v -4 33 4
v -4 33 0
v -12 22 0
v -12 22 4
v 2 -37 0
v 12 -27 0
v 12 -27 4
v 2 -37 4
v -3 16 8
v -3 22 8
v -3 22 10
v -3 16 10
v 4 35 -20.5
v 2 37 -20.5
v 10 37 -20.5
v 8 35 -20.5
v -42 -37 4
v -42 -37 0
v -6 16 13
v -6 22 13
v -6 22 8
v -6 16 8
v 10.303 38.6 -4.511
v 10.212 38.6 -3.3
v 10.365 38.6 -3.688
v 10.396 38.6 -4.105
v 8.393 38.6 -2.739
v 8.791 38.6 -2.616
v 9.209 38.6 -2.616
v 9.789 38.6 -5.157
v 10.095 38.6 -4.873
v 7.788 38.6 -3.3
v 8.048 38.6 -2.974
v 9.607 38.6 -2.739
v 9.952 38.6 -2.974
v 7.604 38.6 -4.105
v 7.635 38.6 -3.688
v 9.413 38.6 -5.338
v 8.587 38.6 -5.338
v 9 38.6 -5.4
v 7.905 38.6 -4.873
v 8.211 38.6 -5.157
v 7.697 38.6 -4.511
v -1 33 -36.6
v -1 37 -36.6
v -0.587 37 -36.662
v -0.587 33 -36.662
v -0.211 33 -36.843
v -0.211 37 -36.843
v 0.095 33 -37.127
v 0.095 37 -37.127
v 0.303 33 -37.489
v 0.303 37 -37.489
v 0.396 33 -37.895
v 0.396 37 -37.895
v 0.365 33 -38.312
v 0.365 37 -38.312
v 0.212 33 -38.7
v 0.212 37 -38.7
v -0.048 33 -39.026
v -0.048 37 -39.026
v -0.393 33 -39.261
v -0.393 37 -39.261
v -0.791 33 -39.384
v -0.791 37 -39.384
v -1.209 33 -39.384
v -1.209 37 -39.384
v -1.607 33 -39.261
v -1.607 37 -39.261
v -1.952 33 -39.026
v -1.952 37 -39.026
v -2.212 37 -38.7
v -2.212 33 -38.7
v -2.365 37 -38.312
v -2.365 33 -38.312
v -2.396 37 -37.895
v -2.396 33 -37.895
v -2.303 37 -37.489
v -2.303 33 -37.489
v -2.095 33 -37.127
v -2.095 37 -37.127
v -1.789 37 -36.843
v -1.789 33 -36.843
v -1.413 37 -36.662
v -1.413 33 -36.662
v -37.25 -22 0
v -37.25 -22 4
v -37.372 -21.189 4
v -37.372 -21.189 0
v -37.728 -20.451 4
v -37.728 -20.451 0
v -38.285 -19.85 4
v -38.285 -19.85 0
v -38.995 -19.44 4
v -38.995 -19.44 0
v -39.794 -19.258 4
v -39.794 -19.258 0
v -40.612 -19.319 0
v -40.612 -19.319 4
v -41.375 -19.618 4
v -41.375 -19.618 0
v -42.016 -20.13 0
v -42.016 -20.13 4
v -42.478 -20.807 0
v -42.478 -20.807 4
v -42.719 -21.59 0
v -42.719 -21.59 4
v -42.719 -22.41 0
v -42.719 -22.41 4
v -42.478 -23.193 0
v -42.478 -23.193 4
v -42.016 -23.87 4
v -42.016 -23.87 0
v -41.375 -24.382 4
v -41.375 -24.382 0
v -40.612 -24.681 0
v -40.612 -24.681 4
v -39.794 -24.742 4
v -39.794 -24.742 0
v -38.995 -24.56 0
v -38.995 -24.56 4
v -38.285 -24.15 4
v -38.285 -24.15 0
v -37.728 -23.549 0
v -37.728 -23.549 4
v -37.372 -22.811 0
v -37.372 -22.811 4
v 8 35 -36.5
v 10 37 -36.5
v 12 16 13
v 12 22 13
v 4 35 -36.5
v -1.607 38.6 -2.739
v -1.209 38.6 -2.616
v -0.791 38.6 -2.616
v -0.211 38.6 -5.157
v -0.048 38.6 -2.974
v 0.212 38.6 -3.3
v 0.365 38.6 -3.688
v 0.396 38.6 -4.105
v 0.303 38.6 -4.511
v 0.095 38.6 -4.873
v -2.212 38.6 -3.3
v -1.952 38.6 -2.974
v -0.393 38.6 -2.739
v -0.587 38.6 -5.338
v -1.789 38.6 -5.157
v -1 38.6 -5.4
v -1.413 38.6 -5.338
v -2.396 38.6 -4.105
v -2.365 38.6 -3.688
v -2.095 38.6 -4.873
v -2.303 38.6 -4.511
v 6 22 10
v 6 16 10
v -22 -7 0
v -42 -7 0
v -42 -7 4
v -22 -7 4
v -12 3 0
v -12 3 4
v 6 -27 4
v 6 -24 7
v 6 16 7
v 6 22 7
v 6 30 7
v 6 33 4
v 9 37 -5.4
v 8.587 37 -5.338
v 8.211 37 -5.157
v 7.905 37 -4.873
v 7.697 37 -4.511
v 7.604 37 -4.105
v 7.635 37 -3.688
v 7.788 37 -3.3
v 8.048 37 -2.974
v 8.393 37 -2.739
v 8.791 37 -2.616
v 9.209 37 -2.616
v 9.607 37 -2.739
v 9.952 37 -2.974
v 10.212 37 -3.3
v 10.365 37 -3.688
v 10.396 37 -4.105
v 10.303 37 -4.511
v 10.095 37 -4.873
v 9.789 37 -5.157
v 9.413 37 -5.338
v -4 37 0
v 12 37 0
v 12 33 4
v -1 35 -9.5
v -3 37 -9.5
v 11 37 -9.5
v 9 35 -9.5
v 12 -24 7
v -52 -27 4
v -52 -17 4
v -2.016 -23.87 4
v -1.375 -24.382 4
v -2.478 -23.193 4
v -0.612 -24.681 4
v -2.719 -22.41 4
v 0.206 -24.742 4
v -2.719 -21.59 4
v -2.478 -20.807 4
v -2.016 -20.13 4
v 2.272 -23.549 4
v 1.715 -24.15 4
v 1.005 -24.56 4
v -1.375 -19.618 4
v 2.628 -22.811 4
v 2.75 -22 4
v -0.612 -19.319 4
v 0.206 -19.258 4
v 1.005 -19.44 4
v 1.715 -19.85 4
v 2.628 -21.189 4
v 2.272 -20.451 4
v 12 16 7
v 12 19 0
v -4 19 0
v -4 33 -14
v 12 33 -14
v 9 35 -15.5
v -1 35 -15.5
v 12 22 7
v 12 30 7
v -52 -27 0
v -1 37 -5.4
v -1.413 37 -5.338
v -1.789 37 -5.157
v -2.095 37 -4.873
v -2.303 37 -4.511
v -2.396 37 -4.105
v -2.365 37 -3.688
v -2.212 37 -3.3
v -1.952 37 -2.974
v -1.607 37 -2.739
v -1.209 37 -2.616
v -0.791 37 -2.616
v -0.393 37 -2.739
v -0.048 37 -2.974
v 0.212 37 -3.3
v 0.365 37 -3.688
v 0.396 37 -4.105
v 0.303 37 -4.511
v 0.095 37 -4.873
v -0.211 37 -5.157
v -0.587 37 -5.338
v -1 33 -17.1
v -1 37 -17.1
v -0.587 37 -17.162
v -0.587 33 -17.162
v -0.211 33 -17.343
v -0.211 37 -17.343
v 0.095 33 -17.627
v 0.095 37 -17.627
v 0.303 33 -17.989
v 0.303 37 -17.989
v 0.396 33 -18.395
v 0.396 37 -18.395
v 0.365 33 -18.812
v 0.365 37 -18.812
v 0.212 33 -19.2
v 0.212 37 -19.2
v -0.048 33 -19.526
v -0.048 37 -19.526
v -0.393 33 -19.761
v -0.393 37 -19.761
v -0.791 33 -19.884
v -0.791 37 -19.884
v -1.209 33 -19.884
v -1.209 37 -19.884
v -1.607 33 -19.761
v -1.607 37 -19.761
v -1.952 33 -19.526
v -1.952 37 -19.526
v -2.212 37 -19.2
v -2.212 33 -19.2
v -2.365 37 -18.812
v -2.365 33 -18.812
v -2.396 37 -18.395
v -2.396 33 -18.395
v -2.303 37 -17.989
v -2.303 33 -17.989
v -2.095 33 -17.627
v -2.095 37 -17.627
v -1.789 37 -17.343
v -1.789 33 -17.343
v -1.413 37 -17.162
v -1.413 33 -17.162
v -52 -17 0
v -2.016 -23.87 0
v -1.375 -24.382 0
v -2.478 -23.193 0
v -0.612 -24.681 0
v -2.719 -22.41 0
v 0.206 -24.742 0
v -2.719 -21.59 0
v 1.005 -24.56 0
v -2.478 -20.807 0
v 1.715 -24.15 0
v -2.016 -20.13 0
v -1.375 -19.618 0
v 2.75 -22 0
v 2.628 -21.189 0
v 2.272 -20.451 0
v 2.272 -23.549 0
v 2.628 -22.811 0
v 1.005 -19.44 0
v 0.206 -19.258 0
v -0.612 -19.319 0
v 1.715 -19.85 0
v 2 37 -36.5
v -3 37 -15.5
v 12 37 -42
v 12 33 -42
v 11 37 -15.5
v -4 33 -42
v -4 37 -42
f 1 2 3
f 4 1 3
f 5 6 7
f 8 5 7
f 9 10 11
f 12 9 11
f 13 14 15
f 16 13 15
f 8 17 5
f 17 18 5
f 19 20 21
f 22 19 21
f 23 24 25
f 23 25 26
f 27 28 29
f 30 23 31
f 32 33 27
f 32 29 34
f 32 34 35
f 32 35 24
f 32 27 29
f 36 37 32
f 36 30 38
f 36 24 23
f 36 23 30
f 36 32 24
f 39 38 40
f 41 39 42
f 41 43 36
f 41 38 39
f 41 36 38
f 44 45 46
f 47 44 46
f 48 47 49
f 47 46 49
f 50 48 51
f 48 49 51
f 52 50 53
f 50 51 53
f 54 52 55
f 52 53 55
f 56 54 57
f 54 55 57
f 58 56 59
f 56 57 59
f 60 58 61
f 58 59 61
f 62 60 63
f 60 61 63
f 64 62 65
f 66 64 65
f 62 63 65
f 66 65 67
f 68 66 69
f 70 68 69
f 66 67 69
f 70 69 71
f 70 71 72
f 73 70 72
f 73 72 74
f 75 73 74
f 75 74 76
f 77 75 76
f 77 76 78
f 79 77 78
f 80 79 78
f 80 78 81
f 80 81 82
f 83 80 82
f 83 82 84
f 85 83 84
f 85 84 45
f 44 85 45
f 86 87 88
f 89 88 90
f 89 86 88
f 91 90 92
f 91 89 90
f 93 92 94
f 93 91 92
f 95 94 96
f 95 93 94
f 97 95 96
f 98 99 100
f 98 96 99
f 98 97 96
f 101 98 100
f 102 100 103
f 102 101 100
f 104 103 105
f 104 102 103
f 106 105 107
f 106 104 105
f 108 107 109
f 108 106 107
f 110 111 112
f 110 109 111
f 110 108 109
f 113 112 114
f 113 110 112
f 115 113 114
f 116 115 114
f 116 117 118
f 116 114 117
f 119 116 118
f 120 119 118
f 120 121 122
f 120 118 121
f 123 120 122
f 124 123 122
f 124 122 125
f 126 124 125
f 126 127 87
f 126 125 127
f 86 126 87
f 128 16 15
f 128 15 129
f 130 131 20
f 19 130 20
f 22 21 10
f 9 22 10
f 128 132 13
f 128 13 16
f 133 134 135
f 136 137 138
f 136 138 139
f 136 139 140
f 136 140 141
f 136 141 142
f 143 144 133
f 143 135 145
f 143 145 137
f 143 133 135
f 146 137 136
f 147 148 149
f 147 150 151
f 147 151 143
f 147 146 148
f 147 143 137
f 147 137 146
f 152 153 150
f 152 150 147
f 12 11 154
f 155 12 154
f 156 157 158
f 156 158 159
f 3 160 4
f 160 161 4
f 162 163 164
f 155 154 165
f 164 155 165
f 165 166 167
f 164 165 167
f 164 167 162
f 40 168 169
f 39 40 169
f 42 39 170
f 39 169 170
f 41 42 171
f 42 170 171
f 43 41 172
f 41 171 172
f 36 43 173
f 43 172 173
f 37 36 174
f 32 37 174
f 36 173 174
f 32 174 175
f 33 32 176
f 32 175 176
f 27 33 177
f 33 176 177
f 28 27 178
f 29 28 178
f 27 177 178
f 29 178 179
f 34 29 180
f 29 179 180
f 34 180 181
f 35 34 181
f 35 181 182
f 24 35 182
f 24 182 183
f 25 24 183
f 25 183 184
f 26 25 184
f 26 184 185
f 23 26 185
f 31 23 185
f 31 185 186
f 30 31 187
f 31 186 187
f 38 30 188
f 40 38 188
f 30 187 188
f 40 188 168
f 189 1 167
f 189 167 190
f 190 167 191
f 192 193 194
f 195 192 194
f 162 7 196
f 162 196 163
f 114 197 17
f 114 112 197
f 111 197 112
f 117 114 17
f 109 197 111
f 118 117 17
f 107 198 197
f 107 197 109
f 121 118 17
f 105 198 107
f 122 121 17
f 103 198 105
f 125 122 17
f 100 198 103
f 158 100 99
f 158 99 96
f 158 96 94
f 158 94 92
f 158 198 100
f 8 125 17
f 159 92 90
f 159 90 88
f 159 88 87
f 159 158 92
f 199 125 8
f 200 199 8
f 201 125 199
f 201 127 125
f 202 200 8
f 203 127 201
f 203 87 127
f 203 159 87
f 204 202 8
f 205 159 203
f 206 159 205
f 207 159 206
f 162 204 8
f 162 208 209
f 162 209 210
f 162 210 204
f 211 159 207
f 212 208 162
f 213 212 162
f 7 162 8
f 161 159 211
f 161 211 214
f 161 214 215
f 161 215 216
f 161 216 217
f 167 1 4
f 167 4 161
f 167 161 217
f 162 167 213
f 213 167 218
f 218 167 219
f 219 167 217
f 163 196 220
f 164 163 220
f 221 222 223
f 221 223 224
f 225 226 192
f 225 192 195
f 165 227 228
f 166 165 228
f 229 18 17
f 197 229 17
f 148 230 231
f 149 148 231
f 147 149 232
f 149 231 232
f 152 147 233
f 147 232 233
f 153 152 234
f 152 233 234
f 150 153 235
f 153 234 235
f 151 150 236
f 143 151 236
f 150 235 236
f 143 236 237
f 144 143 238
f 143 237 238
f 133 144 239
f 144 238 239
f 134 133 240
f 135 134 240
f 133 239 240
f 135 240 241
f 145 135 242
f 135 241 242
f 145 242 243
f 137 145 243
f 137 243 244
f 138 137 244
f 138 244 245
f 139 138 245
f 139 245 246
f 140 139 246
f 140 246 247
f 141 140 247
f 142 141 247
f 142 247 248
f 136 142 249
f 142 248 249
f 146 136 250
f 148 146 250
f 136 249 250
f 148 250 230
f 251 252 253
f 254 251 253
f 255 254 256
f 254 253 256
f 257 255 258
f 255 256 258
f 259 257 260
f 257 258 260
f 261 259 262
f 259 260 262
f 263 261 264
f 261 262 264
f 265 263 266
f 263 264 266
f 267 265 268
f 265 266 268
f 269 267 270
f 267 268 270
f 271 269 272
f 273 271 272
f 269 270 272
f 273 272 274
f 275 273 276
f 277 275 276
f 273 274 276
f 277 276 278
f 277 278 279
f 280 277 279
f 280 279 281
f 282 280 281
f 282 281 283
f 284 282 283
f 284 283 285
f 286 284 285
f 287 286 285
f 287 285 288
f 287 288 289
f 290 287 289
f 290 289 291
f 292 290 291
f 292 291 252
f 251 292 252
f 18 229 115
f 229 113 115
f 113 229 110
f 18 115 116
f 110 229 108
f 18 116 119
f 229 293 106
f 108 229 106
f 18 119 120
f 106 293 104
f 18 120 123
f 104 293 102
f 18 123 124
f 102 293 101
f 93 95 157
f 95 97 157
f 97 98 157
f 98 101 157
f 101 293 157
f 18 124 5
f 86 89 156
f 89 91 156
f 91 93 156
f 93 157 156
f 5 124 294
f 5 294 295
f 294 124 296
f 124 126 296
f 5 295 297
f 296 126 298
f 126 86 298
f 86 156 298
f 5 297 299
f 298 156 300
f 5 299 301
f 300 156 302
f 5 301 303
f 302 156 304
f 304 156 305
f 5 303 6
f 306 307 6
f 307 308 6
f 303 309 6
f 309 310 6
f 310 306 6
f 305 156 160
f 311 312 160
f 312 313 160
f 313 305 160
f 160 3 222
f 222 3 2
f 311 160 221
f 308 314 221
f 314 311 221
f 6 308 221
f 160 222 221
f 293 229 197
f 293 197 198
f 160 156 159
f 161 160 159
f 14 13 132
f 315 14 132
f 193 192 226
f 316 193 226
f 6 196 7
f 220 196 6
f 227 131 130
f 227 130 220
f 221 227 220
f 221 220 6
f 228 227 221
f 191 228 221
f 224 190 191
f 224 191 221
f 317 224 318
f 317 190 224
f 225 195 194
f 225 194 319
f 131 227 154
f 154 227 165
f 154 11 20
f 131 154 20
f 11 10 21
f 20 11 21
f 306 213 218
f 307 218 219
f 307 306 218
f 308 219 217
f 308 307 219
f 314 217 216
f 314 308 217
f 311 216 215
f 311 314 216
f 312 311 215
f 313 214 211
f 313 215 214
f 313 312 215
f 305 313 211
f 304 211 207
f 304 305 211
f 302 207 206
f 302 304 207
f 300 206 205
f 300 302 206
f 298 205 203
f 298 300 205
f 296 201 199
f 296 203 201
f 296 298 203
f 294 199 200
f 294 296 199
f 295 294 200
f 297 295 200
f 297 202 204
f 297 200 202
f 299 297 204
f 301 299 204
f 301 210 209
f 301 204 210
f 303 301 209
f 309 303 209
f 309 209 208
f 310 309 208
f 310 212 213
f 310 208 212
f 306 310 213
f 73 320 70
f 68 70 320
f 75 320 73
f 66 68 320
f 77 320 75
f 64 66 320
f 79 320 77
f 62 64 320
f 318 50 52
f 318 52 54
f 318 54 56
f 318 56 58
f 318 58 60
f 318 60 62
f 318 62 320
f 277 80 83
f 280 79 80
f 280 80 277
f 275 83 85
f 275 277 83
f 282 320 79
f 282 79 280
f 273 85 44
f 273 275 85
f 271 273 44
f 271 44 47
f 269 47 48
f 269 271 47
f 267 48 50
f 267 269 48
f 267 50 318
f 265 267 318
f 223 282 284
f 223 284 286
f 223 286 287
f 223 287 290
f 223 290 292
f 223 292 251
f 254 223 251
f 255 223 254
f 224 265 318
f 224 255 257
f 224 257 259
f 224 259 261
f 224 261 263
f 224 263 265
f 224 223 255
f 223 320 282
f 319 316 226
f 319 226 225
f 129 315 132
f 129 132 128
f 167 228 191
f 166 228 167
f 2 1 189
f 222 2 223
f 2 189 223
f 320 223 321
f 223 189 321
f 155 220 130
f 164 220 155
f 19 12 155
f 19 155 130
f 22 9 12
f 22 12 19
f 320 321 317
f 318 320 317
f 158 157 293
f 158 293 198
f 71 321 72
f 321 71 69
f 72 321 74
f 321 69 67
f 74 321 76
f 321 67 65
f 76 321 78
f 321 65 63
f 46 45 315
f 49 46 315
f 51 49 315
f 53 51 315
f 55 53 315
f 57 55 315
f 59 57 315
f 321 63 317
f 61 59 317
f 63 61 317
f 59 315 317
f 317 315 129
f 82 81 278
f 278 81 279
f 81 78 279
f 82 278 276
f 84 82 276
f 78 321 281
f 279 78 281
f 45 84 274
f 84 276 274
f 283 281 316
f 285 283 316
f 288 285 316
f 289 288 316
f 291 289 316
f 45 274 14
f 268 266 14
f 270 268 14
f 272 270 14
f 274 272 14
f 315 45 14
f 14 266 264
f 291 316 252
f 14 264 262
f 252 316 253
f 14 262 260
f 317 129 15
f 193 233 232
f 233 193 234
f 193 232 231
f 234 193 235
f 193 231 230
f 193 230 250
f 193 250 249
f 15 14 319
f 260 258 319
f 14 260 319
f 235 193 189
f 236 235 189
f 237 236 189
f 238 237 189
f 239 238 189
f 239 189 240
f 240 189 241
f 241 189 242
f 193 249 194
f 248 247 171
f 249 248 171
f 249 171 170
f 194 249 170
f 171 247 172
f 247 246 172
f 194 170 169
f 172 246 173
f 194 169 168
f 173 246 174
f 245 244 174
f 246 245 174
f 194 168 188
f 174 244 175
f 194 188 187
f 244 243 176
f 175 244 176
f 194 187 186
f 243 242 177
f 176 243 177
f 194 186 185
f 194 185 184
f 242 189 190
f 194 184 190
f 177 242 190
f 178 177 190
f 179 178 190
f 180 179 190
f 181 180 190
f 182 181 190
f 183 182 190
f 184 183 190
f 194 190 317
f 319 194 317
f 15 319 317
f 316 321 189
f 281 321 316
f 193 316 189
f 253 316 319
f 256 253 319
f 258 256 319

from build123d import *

# Parameters (mm, degrees)
SKETCH1_W           = 24
SKETCH1_H           = 74
BOSS_EXTRUDE1_DEPTH = 4
SKETCH3_W           = 24
SKETCH3_H           = 4
BOSS_EXTRUDE2_DEPTH = 42
CHAMFER1_SIZE       = 14
CHAMFER2_SIZE       = 4
SKETCH4_W           = 8
SKETCH4_H           = 42
CUT_EXTRUDE3_DEPTH  = 30
SKETCH5_R           = 1.4
BOSS_EXTRUDE3_DEPTH = 1.6
CUT_EXTRUDE4_REACH  = 87.93
SKETCH6_R           = 1.4
BOSS_EXTRUDE4_DEPTH = 6
CUT_EXTRUDE6_REACH  = 60.292
SKETCH11_W          = 40
SKETCH11_H          = 30
BOSS_EXTRUDE6_DEPTH = 4
CUT_EXTRUDE2_REACH  = 79.188
SKETCH2_R           = 2.75
CHAMFER3_SIZE       = 10
SKETCH12_W          = 3
SKETCH12_H          = 60
BOSS_EXTRUDE7_DEPTH = 6
CHAMFER4_SIZE       = 3
SKETCH13_W          = 4
SKETCH13_H          = 16
SKETCH13_W_2        = 10
SKETCH13_H_2        = 6
CUT_EXTRUDE7_DEPTH  = 2
CHAMFER5_SIZE       = 2


with BuildPart() as part:
    # Sketch1 → Boss-Extrude1 (new body)
    with BuildSketch(Plane.XY):
        Rectangle(SKETCH1_W, SKETCH1_H)
    extrude(amount=BOSS_EXTRUDE1_DEPTH)

    # Sketch3 → Boss-Extrude2 (add)
    with BuildSketch(Plane.XY):
        with Locations((0, 35)):
            Rectangle(SKETCH3_W, SKETCH3_H)
    extrude(amount=-BOSS_EXTRUDE2_DEPTH)

    # Chamfer1
    chamfer1_edges = [part.edges().sort_by_distance(p)[0] for p in [
        (0, 33, 0),
    ]]
    chamfer(chamfer1_edges, length=CHAMFER1_SIZE)

    # Chamfer2
    chamfer2_edges = [part.edges().sort_by_distance(p)[0] for p in [
        (0, 37, 4),
    ]]
    chamfer(chamfer2_edges, length=CHAMFER2_SIZE)

    # Sketch4 → Cut-Extrude3 (cut)
    with BuildSketch(Plane(origin=(0, 37, 0), x_dir=(1, 0, 0), z_dir=(0, 1, 0))):
        with Locations((-8, 21)):
            Rectangle(SKETCH4_W, SKETCH4_H)
    extrude(amount=-CUT_EXTRUDE3_DEPTH, mode=Mode.SUBTRACT)

    # Sketch5 → Boss-Extrude3 (add)
    with BuildSketch(Plane(origin=(0, 37, 0), x_dir=(1, 0, 0), z_dir=(0, 1, 0))):
        with Locations(Location((-1, 4, 0), (0, 0, 90))):
            Circle(SKETCH5_R)
        with Locations(Location((9, 4, 0), (0, 0, 90))):
            Circle(SKETCH5_R)
    extrude(amount=BOSS_EXTRUDE3_DEPTH)

    # Sketch6 → Cut-Extrude4 (cut, up to next)
    with BuildSketch(Plane(origin=(0, 37, 0), x_dir=(1, 0, 0), z_dir=(0, 1, 0)), mode=Mode.PRIVATE) as cut_extrude4_sk1:
        with Locations(Location((-1, 18.5, 0), (0, 0, 270))):
            Circle(SKETCH6_R)
    cut_extrude4_tool1 = extrude(cut_extrude4_sk1.sketch, amount=-CUT_EXTRUDE4_REACH, mode=Mode.PRIVATE) & part.part
    # Sketch6 → Cut-Extrude4 (cut, up to next)
    with BuildSketch(Plane(origin=(0, 37, 0), x_dir=(1, 0, 0), z_dir=(0, 1, 0)), mode=Mode.PRIVATE) as cut_extrude4_sk2:
        with Locations(Location((-1, 38, 0), (0, 0, 270))):
            Circle(SKETCH6_R)
    cut_extrude4_tool2 = extrude(cut_extrude4_sk2.sketch, amount=-CUT_EXTRUDE4_REACH, mode=Mode.PRIVATE) & part.part
    add(cut_extrude4_tool1.solids().sort_by_distance((-1, 37, -18.5))[0], mode=Mode.SUBTRACT)
    add(cut_extrude4_tool2.solids().sort_by_distance((-1, 37, -38))[0], mode=Mode.SUBTRACT)

    # Sketch7 → Boss-Extrude4 (add)
    with BuildSketch(Plane(origin=(0, 22, 0), x_dir=(1, 0, 0), z_dir=(0, 1, 0))):
        Polygon((12, -4), (12, -13), (-6, -13), (-6, -8), (-3, -8), (-3, -10), (6, -10), (6, -4), align=None)
    extrude(amount=-BOSS_EXTRUDE4_DEPTH)

    # Sketch9 → Cut-Extrude6 (cut, up to next)
    with BuildSketch(Plane.XY, mode=Mode.PRIVATE) as cut_extrude6_sk1:
        Polygon((-4, 37), (-4, 33), (-12, 22), (-12, 37), align=None)
    cut_extrude6_tool1 = extrude(cut_extrude6_sk1.sketch, amount=CUT_EXTRUDE6_REACH, mode=Mode.PRIVATE) & part.part
    add(cut_extrude6_tool1.solids().sort_by_distance((-8.77193, 31.719298, 0))[0], mode=Mode.SUBTRACT)

    # Sketch11 → Boss-Extrude6 (add)
    with BuildSketch(Plane.XY):
        with Locations((-32, -22)):
            Rectangle(SKETCH11_W, SKETCH11_H)
    extrude(amount=BOSS_EXTRUDE6_DEPTH)

    # Sketch2 → Cut-Extrude2 (cut, up to next)
    with BuildSketch(Plane.XY, mode=Mode.PRIVATE) as cut_extrude2_sk1:
        with Locations((0, -22)):
            Circle(SKETCH2_R)
    cut_extrude2_tool1 = extrude(cut_extrude2_sk1.sketch, amount=CUT_EXTRUDE2_REACH, mode=Mode.PRIVATE) & part.part
    # Sketch2 → Cut-Extrude2 (cut, up to next)
    with BuildSketch(Plane.XY, mode=Mode.PRIVATE) as cut_extrude2_sk2:
        with Locations((-40, -22)):
            Circle(SKETCH2_R)
    cut_extrude2_tool2 = extrude(cut_extrude2_sk2.sketch, amount=CUT_EXTRUDE2_REACH, mode=Mode.PRIVATE) & part.part
    add(cut_extrude2_tool1.solids().sort_by_distance((0, -22, 0))[0], mode=Mode.SUBTRACT)
    add(cut_extrude2_tool2.solids().sort_by_distance((-40, -22, 0))[0], mode=Mode.SUBTRACT)

    # Chamfer3
    chamfer3_edges = [part.edges().sort_by_distance(p)[0] for p in [
        (-12, -7, 2),
        (-52, -37, 2),
        (-52, -7, 2),
        (12, -37, 2),
    ]]
    chamfer(chamfer3_edges, length=CHAMFER3_SIZE)

    # Sketch12 → Boss-Extrude7 (add)
    with BuildSketch(Plane(origin=(12, 0, 0), x_dir=(0, 0, -1), z_dir=(1, 0, 0))):
        with Locations((-5.5, 3)):
            Rectangle(SKETCH12_W, SKETCH12_H)
    extrude(amount=-BOSS_EXTRUDE7_DEPTH)

    # Chamfer4
    chamfer4_edges = [part.edges().sort_by_distance(p)[0] for p in [
        (9, 33, 7),
        (9, -27, 7),
    ]]
    chamfer(chamfer4_edges, length=CHAMFER4_SIZE - 0.0001)  # a hair under: the kernel refuses the full size

    # Sketch13 → Cut-Extrude7 (cut)
    with BuildSketch(Plane(origin=(0, 37, 0), x_dir=(1, 0, 0), z_dir=(0, 1, 0))):
        with Locations((6, 28.5)):
            Rectangle(SKETCH13_W, SKETCH13_H)
        with Locations((4, 12.5)):
            Rectangle(SKETCH13_W_2, SKETCH13_H_2)
    extrude(amount=-CUT_EXTRUDE7_DEPTH, mode=Mode.SUBTRACT)

    # Chamfer5
    chamfer5_edges = [part.edges().sort_by_distance(p)[0] for p in [
        (4, 37, -28.5),
        (-1, 37, -12.5),
        (9, 37, -12.5),
        (8, 37, -28.5),
    ]]
    chamfer(chamfer5_edges, length=CHAMFER5_SIZE - 0.0001)  # a hair under: the kernel refuses the full size


solid = part.part
